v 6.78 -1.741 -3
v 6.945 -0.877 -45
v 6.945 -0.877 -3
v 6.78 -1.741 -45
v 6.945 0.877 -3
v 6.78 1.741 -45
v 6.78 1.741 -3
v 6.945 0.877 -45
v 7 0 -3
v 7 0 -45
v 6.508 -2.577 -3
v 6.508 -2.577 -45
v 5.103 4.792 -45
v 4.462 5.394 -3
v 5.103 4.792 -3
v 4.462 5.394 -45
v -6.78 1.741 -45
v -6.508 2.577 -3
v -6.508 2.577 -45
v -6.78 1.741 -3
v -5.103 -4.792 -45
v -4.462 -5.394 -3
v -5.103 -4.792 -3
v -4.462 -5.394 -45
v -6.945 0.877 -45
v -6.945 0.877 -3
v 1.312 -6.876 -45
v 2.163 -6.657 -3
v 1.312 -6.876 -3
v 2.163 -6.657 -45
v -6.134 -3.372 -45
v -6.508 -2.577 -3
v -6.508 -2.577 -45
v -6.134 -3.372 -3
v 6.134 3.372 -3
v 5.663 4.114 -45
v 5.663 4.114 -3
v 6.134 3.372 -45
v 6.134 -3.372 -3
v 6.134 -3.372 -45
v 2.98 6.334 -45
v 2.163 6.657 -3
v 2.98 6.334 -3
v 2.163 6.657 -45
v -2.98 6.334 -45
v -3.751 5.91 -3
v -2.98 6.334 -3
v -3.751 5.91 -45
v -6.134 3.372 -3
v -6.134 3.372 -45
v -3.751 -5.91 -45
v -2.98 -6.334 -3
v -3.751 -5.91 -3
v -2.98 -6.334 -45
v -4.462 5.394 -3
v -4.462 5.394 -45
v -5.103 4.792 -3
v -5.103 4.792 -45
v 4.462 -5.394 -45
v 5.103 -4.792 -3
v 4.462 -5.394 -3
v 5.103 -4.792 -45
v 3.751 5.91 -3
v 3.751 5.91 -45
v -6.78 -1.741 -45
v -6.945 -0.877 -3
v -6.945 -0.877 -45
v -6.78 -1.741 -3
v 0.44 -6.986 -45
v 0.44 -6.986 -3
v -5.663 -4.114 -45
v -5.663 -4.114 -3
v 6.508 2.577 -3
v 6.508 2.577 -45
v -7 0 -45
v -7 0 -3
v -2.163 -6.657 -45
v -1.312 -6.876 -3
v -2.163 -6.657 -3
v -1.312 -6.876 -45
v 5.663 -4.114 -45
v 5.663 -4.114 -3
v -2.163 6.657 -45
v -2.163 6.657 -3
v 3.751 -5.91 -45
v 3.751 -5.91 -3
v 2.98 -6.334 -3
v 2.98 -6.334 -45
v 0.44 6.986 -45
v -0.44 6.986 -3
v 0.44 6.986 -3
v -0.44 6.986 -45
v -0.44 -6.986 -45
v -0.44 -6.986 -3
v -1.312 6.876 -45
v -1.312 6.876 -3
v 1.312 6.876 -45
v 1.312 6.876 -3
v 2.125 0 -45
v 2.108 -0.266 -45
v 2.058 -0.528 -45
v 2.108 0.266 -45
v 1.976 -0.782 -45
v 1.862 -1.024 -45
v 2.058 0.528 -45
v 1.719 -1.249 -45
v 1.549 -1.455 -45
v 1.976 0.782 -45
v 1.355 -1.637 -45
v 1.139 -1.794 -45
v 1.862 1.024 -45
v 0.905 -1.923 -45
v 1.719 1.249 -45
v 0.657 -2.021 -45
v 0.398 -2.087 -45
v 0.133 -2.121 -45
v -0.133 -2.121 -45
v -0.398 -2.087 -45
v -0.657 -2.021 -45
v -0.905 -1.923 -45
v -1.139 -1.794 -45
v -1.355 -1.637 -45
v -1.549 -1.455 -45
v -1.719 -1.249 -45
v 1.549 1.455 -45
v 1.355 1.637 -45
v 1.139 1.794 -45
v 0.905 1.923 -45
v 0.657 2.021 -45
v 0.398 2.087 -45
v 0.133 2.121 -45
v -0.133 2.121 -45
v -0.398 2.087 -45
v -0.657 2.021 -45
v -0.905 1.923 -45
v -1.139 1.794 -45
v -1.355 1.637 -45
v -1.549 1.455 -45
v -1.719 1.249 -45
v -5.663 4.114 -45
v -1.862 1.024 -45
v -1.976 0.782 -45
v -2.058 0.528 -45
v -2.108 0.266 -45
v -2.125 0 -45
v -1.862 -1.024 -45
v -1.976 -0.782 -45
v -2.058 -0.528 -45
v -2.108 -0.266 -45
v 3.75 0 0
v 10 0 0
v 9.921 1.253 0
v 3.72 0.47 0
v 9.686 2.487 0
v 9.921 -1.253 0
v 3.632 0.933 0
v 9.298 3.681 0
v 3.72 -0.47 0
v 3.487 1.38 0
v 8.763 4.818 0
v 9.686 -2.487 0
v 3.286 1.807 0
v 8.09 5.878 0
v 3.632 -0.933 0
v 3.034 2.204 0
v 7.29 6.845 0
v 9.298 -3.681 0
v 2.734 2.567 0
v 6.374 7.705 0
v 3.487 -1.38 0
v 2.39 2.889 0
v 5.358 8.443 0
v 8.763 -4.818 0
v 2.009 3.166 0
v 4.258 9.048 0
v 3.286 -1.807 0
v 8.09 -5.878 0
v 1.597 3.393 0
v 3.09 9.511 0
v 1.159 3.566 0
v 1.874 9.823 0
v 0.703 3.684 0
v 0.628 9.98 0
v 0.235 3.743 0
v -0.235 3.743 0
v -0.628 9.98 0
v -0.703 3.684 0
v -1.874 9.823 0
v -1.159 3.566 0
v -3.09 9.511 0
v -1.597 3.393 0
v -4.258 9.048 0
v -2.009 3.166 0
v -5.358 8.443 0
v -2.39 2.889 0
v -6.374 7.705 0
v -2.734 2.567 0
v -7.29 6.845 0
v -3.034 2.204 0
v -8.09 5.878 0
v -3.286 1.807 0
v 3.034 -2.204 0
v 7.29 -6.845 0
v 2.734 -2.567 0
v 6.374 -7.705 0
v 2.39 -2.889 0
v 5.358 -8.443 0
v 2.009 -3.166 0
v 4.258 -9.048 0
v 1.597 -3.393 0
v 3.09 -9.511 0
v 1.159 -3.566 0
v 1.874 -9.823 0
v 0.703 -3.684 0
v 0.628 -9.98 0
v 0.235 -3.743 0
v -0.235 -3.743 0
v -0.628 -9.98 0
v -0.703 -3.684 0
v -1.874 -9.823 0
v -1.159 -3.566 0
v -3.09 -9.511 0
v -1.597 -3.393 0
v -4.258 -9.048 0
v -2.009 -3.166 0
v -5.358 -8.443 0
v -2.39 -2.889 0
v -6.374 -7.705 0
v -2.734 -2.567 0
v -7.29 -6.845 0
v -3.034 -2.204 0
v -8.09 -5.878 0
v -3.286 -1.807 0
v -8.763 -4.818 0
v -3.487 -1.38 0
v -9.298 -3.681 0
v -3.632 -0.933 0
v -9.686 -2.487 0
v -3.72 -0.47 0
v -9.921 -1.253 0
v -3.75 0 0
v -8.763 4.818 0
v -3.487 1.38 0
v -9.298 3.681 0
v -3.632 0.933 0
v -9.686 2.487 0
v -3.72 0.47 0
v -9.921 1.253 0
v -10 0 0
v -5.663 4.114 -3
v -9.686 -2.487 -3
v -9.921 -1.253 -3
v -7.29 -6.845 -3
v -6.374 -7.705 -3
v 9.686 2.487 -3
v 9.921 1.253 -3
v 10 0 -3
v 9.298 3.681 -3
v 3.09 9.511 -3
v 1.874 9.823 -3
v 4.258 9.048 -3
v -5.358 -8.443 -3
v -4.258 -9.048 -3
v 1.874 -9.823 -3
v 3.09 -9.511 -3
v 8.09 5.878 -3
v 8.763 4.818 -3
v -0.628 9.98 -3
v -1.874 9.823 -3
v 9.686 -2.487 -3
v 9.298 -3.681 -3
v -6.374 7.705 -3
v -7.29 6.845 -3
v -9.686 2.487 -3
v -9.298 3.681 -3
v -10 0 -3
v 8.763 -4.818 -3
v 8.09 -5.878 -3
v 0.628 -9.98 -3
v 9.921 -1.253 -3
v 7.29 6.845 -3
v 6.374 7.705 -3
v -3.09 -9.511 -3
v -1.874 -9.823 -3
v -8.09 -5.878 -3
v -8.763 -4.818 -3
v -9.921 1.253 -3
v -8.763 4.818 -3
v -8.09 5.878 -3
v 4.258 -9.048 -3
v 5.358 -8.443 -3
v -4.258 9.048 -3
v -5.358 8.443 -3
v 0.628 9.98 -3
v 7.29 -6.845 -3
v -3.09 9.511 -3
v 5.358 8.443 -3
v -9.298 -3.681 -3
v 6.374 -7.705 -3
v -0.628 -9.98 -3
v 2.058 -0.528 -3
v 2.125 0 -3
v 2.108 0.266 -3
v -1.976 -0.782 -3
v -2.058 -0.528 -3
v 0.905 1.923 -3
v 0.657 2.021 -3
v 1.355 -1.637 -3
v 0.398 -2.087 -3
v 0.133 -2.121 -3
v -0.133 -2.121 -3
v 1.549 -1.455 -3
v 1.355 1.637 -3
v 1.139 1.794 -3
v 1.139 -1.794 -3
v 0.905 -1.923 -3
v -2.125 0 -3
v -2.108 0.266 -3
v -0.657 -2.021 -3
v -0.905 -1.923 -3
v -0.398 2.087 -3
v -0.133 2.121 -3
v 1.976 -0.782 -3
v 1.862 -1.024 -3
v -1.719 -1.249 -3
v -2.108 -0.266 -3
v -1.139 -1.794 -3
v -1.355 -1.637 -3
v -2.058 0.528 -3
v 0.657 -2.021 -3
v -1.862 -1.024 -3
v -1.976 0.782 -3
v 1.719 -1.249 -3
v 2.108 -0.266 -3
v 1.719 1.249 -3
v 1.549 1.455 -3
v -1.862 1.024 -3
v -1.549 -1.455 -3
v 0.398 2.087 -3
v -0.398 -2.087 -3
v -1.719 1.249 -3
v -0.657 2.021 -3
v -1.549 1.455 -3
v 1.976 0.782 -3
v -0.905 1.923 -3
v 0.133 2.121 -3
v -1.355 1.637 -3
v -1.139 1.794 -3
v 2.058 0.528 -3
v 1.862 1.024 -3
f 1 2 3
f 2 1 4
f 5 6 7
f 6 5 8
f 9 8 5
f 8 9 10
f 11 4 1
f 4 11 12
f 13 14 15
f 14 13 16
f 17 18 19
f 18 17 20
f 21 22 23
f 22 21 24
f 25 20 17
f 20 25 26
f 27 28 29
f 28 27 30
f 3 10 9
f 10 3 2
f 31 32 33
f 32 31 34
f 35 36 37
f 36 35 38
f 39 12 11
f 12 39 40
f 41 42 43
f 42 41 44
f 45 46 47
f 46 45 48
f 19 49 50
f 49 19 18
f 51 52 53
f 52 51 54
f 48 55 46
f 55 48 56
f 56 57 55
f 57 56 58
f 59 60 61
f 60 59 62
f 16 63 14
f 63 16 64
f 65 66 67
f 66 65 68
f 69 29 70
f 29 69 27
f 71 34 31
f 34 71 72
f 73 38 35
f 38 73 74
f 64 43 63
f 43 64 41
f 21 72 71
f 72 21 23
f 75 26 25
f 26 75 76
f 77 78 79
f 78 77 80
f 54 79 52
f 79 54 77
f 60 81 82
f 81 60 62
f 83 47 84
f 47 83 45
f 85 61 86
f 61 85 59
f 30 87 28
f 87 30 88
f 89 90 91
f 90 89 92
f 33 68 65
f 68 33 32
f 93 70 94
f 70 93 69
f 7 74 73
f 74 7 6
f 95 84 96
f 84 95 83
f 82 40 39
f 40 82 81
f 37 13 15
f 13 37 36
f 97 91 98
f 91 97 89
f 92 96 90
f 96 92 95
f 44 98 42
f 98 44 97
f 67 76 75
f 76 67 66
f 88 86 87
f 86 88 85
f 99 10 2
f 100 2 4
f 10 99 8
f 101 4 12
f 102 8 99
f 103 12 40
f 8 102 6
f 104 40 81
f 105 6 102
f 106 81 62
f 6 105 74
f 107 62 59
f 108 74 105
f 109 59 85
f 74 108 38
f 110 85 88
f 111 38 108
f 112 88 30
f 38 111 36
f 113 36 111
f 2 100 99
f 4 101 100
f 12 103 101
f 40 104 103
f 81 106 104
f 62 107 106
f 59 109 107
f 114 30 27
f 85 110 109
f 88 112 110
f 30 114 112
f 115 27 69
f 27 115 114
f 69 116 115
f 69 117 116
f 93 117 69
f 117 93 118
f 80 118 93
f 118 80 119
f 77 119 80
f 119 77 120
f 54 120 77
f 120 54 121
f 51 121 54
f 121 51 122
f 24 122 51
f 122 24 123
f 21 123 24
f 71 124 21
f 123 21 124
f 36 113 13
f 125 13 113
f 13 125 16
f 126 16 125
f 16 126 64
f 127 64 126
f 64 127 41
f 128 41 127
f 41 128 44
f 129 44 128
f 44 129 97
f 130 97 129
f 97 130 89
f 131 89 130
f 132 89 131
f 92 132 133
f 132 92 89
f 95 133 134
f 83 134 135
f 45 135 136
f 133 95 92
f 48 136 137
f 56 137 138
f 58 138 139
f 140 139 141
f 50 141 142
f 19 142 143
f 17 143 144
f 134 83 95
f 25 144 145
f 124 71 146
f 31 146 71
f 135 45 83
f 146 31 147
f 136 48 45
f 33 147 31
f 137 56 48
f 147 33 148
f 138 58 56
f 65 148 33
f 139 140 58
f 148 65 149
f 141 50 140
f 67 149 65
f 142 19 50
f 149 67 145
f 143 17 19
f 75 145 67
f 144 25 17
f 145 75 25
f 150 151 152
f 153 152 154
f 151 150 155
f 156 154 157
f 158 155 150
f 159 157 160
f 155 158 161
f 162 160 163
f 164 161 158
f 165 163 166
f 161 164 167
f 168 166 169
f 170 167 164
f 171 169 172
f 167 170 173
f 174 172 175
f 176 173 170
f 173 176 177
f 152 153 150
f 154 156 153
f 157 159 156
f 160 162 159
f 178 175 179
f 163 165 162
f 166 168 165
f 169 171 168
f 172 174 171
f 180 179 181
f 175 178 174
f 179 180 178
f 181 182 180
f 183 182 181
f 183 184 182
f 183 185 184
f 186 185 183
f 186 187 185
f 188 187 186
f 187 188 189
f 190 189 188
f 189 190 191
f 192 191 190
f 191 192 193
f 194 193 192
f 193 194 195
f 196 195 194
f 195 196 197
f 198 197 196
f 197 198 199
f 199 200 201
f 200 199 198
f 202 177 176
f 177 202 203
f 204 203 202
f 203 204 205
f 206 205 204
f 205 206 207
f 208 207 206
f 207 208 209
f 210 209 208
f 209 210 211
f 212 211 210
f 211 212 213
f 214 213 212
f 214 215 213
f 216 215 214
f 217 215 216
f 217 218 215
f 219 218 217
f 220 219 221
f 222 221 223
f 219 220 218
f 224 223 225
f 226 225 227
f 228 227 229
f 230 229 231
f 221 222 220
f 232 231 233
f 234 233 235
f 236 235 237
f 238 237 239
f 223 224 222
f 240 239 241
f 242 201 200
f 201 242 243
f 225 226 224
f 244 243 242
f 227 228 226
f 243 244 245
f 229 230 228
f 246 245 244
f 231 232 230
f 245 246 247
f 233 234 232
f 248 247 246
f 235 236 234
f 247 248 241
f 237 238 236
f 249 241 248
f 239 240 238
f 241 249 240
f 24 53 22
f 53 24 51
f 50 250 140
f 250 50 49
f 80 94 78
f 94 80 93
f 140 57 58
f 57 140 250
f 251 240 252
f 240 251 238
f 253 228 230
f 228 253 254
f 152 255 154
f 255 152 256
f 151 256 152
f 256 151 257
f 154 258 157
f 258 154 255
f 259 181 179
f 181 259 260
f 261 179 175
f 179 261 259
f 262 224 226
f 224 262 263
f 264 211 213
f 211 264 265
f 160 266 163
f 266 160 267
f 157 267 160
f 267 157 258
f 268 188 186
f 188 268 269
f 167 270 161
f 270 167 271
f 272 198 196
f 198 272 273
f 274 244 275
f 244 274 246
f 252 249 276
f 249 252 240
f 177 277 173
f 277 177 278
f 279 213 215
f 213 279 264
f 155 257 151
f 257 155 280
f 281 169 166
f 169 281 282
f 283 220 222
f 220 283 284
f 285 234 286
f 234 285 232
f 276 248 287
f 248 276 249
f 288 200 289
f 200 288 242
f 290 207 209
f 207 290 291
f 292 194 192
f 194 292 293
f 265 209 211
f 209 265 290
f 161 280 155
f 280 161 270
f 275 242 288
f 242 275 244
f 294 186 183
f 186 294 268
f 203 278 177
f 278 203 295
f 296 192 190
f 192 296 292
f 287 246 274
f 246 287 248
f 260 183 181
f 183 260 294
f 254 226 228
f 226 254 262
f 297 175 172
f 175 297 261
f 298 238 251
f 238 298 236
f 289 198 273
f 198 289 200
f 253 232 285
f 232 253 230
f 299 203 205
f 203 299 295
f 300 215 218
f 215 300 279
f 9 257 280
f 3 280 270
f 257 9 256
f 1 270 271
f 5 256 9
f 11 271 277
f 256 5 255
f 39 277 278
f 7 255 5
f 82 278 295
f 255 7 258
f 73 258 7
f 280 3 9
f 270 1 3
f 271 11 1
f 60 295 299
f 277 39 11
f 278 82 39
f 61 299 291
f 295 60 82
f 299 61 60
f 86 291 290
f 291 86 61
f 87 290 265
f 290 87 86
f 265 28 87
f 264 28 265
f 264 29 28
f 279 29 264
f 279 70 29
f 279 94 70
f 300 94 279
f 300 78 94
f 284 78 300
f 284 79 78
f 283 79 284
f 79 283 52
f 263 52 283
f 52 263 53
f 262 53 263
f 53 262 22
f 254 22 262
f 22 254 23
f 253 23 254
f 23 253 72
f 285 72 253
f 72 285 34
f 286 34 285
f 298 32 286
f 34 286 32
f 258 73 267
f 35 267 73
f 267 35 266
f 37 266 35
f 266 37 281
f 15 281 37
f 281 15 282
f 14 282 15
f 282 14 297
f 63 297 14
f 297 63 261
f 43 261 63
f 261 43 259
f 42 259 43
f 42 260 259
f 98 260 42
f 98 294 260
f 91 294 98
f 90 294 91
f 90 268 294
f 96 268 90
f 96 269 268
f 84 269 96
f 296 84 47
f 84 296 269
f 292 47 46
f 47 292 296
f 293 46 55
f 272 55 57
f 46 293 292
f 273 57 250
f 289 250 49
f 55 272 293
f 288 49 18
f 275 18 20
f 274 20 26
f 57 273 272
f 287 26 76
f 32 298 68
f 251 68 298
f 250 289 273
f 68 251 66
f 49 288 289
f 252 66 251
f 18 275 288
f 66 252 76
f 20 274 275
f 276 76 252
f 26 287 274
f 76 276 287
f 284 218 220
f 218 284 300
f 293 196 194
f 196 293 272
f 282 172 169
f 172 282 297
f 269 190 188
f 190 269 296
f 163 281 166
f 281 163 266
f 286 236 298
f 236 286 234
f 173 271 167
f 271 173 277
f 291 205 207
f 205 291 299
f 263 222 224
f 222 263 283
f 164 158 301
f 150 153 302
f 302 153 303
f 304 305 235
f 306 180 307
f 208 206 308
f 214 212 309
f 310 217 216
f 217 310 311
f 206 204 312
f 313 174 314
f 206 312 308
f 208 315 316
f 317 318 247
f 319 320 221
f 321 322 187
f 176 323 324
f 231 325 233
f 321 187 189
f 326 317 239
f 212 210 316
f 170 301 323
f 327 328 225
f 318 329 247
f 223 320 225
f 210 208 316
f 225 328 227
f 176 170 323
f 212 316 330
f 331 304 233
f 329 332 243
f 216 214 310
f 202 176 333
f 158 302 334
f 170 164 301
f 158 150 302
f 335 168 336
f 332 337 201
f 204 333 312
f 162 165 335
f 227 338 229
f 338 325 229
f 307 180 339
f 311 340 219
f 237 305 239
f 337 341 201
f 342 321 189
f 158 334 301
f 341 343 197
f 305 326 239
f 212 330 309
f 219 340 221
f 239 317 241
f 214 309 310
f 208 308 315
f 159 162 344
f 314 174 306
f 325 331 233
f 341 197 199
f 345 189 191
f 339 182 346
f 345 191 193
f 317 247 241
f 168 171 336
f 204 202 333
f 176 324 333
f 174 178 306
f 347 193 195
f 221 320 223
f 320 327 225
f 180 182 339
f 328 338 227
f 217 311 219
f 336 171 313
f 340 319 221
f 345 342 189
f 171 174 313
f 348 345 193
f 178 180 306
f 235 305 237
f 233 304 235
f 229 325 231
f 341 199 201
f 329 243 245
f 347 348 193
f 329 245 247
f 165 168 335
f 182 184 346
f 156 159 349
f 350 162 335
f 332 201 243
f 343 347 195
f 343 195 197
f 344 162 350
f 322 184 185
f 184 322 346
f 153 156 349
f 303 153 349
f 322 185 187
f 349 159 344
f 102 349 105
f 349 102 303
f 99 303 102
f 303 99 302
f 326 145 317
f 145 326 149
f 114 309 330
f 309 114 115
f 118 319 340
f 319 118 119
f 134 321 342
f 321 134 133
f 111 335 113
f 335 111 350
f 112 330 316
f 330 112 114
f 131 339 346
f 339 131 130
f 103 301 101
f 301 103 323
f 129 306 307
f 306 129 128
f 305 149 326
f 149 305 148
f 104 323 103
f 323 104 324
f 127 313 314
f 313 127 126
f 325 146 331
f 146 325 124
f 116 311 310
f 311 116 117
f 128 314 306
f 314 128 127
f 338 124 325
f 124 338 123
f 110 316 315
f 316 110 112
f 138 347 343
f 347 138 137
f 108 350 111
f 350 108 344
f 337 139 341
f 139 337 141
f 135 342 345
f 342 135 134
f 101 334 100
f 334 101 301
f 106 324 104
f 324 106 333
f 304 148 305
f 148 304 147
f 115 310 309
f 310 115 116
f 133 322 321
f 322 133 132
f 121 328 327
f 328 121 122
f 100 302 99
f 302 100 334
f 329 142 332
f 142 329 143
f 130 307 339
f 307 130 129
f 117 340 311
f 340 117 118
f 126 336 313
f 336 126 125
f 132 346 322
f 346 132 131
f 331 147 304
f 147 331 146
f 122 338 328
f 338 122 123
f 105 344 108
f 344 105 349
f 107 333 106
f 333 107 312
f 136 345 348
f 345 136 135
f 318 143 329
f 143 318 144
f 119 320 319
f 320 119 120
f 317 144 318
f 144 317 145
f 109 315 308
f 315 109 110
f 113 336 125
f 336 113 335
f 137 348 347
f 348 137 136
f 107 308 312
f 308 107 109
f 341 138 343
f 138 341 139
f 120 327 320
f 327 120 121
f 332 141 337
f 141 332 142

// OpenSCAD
$fn = 50;


difference() {
	union() {
		translate(v = [0, 0, -45.0000000000]) {
			cylinder(h = 45, r = 7.0000000000);
		}
		translate(v = [0, 0, -3.0000000000]) {
			cylinder(h = 3, r = 10.0000000000);
		}
	}
	union() {
		translate(v = [0, 0, 0]) {
			rotate(a = [0, 0, 0]) {
				difference() {
					union() {
						#translate(v = [0, 0, -45.0000000000]) {
							cylinder(h = 45, r = 2.0000000000);
						}
						#translate(v = [0, 0, -3]) {
							cylinder(h = 3, r1 = 2.1250000000, r2 = 3.7500000000);
						}
						#translate(v = [0, 0, -45.0000000000]) {
							cylinder(h = 45, r = 2.1250000000);
						}
						#translate(v = [0, 0, -45.0000000000]) {
							cylinder(h = 45, r = 2.0000000000);
						}
					}
					union();
				}
			}
		}
	}
}
